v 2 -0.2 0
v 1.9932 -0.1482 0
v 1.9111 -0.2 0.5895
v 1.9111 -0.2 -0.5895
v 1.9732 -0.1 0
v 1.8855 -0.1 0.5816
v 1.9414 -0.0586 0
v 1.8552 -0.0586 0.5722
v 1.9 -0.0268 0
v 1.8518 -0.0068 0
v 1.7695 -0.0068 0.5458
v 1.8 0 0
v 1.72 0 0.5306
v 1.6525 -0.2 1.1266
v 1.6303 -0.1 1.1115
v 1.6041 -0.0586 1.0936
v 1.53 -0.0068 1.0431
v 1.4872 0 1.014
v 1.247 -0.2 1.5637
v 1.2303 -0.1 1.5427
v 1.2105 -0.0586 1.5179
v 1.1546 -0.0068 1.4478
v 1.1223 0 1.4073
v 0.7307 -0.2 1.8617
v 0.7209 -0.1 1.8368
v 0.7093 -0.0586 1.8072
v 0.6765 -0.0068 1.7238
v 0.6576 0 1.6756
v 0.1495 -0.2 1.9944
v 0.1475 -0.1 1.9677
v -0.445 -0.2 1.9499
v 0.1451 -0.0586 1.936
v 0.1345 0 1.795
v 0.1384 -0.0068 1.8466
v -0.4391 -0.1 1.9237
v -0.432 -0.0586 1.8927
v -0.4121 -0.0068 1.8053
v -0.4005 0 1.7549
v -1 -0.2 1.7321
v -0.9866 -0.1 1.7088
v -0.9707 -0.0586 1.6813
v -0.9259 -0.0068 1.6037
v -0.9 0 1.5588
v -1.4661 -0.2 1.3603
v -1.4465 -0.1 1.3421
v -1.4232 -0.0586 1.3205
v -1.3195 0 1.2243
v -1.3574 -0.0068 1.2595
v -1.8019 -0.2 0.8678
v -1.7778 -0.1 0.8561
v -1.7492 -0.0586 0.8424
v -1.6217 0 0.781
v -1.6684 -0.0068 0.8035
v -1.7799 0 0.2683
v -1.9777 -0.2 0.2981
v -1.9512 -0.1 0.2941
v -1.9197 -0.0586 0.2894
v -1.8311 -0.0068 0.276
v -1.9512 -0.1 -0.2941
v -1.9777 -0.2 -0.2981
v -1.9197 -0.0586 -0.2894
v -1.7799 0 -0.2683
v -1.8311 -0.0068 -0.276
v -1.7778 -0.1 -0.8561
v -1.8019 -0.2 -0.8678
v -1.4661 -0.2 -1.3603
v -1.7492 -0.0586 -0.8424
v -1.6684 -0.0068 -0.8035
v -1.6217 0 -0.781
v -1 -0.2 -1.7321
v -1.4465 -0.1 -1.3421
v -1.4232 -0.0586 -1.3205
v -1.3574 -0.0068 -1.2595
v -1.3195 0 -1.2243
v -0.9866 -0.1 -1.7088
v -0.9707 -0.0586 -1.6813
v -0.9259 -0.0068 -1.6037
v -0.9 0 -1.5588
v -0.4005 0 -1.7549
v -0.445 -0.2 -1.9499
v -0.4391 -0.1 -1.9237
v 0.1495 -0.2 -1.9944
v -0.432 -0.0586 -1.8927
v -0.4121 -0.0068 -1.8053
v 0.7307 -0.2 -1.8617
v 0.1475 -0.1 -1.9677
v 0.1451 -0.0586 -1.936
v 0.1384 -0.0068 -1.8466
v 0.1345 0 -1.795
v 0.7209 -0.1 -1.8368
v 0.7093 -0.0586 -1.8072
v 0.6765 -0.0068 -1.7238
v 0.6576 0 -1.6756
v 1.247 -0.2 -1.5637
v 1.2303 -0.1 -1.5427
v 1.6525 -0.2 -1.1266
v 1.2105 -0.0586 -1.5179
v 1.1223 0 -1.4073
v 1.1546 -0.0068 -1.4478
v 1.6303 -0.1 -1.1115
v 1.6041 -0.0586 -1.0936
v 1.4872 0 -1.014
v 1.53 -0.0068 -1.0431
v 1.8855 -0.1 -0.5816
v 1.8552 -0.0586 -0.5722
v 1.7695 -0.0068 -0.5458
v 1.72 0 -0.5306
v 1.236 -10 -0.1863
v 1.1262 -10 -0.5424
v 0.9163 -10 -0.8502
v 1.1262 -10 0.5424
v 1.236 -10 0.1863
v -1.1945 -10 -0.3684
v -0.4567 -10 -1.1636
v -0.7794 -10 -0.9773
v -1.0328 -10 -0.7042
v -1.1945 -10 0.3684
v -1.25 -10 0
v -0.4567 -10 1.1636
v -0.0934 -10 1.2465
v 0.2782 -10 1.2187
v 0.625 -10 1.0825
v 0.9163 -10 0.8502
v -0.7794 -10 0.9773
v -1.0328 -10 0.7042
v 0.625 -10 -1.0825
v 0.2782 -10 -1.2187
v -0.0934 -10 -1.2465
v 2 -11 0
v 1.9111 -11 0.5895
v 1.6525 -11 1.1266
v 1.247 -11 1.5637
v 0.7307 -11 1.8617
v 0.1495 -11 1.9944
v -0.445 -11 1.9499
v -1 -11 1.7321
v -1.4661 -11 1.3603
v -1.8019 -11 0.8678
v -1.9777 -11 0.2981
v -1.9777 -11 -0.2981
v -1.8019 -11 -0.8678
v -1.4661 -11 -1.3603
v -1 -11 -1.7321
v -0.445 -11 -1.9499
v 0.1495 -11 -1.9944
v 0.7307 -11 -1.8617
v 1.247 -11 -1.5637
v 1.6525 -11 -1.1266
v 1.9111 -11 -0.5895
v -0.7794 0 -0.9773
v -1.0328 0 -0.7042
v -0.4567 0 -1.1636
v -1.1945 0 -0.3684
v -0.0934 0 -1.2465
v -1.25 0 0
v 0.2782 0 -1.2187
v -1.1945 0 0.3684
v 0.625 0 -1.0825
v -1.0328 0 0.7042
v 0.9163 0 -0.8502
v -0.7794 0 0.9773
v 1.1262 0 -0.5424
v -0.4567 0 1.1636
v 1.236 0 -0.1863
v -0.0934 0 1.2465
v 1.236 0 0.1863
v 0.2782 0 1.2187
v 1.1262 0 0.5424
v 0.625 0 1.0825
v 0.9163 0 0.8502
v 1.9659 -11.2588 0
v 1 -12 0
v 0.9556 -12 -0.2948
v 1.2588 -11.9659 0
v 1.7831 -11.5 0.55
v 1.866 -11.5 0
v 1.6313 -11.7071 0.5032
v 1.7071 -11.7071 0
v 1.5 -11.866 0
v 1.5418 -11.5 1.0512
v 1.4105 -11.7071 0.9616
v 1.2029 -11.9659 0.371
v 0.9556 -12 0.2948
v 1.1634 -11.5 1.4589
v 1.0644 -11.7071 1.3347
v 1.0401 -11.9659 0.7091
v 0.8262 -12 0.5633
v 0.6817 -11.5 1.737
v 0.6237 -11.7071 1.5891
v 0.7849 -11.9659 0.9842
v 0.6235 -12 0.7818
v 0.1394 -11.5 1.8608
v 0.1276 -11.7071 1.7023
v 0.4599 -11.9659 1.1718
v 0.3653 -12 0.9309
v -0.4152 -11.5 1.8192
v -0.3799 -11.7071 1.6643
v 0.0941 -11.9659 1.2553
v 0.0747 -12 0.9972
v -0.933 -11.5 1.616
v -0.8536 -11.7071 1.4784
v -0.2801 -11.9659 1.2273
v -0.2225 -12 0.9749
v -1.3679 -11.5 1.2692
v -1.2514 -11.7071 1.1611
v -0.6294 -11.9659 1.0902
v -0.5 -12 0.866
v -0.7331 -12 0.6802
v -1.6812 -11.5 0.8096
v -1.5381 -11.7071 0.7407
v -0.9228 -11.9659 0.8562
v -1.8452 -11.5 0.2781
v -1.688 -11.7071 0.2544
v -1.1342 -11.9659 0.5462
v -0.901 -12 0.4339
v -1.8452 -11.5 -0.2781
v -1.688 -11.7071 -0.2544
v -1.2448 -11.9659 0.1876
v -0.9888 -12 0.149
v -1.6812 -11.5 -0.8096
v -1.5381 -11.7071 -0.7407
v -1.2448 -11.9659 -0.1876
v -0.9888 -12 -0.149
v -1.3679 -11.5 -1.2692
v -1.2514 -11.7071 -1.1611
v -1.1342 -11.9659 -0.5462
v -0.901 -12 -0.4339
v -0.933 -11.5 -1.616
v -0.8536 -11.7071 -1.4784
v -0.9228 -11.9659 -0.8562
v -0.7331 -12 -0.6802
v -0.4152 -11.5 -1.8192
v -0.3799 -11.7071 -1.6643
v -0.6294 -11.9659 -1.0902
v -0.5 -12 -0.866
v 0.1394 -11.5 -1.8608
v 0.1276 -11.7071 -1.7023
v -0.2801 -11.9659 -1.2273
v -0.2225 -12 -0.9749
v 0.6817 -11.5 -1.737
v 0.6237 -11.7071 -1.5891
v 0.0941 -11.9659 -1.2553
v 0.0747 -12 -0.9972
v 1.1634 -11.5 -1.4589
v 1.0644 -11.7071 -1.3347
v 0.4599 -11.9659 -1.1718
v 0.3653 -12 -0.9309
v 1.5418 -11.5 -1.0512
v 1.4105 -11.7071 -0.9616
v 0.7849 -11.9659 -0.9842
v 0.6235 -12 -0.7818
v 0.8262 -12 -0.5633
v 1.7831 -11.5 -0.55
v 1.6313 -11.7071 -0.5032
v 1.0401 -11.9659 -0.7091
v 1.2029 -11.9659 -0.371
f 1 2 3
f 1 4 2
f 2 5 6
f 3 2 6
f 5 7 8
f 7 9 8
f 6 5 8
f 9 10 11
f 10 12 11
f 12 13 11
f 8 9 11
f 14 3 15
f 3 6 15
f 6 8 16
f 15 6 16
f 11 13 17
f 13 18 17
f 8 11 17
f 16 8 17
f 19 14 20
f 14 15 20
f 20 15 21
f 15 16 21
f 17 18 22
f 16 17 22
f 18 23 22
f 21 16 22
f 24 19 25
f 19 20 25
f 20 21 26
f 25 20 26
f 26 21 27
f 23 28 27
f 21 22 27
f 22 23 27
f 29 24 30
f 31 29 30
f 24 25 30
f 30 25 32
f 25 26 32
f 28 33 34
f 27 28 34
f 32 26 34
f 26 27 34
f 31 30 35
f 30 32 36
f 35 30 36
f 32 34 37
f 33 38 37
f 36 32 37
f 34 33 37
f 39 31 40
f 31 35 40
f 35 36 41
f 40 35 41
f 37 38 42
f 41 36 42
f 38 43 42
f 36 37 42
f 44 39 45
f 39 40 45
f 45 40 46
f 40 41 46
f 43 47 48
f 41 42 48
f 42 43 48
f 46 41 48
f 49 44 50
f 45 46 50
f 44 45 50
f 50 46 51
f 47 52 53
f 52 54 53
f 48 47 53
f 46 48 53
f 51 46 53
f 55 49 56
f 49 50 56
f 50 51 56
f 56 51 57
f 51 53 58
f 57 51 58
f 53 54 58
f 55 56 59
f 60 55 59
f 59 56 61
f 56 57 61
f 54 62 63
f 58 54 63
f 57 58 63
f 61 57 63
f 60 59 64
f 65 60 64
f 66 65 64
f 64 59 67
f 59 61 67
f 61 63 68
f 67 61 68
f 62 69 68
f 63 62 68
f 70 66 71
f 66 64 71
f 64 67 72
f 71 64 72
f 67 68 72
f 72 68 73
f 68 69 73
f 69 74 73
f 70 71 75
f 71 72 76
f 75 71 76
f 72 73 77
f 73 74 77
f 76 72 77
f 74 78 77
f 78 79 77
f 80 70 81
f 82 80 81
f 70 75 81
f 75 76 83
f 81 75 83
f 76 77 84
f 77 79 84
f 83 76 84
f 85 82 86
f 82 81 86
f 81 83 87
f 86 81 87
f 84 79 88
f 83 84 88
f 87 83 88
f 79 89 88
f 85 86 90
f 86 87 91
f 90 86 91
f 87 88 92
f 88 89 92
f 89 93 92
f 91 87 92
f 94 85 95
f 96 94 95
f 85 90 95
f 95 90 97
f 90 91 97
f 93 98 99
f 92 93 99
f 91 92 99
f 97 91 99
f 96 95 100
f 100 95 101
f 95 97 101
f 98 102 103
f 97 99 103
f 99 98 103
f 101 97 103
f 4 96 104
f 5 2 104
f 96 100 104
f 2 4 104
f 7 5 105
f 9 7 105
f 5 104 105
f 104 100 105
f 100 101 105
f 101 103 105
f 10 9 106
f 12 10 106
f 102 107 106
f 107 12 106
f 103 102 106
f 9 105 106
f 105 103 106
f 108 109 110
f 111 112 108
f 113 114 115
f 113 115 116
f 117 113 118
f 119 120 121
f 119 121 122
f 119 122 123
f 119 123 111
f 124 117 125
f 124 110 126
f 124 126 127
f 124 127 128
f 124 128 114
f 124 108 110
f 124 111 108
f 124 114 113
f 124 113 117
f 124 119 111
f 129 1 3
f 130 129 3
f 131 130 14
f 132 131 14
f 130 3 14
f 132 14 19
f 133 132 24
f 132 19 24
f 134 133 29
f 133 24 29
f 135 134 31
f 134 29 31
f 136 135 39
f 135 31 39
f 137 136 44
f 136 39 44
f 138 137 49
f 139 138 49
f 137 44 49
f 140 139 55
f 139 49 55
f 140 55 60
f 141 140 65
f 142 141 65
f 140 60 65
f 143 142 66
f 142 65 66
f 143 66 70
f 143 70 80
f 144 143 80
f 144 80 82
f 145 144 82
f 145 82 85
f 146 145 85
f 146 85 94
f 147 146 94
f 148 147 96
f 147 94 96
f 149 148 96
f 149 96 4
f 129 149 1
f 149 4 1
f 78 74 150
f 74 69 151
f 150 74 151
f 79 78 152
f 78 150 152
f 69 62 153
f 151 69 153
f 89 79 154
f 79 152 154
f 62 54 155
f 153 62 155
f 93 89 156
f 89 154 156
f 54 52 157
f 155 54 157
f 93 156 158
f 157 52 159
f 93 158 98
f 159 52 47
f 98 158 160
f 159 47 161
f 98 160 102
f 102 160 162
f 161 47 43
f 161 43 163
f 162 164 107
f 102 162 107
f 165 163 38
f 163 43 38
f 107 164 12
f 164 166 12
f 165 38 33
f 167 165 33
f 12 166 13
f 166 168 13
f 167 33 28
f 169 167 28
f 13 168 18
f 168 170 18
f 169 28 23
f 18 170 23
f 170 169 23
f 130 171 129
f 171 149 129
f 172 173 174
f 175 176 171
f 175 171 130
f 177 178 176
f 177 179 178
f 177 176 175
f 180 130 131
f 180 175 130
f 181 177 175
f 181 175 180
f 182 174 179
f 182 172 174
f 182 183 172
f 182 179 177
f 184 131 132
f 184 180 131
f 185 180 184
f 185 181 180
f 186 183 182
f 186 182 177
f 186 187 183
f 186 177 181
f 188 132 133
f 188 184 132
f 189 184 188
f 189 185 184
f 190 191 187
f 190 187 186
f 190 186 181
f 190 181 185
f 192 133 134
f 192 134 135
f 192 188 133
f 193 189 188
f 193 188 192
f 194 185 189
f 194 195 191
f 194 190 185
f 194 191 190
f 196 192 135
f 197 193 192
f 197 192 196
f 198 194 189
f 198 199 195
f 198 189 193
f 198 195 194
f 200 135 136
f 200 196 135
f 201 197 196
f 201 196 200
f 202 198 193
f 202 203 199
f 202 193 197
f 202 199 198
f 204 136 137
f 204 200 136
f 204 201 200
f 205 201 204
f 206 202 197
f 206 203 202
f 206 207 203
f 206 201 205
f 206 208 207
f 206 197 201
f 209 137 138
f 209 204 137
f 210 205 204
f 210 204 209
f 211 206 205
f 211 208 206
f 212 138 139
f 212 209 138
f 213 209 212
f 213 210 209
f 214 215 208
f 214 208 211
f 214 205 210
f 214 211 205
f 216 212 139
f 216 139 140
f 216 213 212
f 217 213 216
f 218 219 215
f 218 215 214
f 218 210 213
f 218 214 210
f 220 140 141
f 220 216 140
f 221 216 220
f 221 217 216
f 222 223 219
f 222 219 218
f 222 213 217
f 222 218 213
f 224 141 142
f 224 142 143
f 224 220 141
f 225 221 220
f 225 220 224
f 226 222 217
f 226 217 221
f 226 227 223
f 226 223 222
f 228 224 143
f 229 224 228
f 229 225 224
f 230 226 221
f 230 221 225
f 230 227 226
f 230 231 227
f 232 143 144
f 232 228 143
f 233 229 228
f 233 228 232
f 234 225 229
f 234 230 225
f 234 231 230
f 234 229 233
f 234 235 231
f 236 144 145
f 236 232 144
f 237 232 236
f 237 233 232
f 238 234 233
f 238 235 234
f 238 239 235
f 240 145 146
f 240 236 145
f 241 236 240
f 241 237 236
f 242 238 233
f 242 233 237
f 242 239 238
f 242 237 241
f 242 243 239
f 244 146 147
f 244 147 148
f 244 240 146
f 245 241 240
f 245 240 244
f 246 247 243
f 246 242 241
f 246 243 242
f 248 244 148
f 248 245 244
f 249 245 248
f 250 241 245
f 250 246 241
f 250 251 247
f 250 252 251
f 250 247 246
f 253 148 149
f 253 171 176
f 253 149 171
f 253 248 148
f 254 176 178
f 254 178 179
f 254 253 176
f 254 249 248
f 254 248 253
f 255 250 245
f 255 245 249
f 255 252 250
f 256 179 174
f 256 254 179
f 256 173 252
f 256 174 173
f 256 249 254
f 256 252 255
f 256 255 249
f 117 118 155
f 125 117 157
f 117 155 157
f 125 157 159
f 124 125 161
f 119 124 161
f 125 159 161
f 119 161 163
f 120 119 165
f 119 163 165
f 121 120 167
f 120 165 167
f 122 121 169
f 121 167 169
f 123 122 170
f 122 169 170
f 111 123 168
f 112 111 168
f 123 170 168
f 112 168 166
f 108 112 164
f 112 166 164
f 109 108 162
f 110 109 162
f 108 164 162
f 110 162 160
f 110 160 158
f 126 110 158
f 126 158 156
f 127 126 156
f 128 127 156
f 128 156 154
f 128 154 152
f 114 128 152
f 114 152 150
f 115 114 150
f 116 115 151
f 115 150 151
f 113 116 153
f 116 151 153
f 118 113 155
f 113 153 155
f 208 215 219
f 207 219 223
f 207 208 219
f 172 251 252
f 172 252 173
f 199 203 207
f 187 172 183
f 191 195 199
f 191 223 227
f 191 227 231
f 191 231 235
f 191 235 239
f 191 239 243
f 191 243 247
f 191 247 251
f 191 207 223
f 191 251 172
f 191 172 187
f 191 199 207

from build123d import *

# Parameters (mm, degrees)
F1_R     = 2
F2_DEPTH = 12
F3_R     = 1
F4_R     = 0.2
F5_R     = 1.25
F6_DEPTH = 10


with BuildPart() as f2:
    # F1 (on Front) → F2 (new body)
    with BuildSketch(Plane.XZ):
        Circle(F1_R)
    extrude(amount=F2_DEPTH)

    # F3
    f3_edges = [f2.edges().sort_by_distance(p)[0] for p in [
        (-2, -12, 0),
    ]]
    fillet(f3_edges, radius=F3_R)

    # F4
    f4_edges = [f2.edges().sort_by_distance(p)[0] for p in [
        (-2, 0, 0),
    ]]
    fillet(f4_edges, radius=F4_R)

    # F5 (on face) → F6 (cut)
    with BuildSketch(Plane(origin=(0, 0, 0), x_dir=(-1, 0, 0), z_dir=(0, 1, 0))):
        Circle(F5_R)
    extrude(amount=-F6_DEPTH, mode=Mode.SUBTRACT)


solid = f2.part
